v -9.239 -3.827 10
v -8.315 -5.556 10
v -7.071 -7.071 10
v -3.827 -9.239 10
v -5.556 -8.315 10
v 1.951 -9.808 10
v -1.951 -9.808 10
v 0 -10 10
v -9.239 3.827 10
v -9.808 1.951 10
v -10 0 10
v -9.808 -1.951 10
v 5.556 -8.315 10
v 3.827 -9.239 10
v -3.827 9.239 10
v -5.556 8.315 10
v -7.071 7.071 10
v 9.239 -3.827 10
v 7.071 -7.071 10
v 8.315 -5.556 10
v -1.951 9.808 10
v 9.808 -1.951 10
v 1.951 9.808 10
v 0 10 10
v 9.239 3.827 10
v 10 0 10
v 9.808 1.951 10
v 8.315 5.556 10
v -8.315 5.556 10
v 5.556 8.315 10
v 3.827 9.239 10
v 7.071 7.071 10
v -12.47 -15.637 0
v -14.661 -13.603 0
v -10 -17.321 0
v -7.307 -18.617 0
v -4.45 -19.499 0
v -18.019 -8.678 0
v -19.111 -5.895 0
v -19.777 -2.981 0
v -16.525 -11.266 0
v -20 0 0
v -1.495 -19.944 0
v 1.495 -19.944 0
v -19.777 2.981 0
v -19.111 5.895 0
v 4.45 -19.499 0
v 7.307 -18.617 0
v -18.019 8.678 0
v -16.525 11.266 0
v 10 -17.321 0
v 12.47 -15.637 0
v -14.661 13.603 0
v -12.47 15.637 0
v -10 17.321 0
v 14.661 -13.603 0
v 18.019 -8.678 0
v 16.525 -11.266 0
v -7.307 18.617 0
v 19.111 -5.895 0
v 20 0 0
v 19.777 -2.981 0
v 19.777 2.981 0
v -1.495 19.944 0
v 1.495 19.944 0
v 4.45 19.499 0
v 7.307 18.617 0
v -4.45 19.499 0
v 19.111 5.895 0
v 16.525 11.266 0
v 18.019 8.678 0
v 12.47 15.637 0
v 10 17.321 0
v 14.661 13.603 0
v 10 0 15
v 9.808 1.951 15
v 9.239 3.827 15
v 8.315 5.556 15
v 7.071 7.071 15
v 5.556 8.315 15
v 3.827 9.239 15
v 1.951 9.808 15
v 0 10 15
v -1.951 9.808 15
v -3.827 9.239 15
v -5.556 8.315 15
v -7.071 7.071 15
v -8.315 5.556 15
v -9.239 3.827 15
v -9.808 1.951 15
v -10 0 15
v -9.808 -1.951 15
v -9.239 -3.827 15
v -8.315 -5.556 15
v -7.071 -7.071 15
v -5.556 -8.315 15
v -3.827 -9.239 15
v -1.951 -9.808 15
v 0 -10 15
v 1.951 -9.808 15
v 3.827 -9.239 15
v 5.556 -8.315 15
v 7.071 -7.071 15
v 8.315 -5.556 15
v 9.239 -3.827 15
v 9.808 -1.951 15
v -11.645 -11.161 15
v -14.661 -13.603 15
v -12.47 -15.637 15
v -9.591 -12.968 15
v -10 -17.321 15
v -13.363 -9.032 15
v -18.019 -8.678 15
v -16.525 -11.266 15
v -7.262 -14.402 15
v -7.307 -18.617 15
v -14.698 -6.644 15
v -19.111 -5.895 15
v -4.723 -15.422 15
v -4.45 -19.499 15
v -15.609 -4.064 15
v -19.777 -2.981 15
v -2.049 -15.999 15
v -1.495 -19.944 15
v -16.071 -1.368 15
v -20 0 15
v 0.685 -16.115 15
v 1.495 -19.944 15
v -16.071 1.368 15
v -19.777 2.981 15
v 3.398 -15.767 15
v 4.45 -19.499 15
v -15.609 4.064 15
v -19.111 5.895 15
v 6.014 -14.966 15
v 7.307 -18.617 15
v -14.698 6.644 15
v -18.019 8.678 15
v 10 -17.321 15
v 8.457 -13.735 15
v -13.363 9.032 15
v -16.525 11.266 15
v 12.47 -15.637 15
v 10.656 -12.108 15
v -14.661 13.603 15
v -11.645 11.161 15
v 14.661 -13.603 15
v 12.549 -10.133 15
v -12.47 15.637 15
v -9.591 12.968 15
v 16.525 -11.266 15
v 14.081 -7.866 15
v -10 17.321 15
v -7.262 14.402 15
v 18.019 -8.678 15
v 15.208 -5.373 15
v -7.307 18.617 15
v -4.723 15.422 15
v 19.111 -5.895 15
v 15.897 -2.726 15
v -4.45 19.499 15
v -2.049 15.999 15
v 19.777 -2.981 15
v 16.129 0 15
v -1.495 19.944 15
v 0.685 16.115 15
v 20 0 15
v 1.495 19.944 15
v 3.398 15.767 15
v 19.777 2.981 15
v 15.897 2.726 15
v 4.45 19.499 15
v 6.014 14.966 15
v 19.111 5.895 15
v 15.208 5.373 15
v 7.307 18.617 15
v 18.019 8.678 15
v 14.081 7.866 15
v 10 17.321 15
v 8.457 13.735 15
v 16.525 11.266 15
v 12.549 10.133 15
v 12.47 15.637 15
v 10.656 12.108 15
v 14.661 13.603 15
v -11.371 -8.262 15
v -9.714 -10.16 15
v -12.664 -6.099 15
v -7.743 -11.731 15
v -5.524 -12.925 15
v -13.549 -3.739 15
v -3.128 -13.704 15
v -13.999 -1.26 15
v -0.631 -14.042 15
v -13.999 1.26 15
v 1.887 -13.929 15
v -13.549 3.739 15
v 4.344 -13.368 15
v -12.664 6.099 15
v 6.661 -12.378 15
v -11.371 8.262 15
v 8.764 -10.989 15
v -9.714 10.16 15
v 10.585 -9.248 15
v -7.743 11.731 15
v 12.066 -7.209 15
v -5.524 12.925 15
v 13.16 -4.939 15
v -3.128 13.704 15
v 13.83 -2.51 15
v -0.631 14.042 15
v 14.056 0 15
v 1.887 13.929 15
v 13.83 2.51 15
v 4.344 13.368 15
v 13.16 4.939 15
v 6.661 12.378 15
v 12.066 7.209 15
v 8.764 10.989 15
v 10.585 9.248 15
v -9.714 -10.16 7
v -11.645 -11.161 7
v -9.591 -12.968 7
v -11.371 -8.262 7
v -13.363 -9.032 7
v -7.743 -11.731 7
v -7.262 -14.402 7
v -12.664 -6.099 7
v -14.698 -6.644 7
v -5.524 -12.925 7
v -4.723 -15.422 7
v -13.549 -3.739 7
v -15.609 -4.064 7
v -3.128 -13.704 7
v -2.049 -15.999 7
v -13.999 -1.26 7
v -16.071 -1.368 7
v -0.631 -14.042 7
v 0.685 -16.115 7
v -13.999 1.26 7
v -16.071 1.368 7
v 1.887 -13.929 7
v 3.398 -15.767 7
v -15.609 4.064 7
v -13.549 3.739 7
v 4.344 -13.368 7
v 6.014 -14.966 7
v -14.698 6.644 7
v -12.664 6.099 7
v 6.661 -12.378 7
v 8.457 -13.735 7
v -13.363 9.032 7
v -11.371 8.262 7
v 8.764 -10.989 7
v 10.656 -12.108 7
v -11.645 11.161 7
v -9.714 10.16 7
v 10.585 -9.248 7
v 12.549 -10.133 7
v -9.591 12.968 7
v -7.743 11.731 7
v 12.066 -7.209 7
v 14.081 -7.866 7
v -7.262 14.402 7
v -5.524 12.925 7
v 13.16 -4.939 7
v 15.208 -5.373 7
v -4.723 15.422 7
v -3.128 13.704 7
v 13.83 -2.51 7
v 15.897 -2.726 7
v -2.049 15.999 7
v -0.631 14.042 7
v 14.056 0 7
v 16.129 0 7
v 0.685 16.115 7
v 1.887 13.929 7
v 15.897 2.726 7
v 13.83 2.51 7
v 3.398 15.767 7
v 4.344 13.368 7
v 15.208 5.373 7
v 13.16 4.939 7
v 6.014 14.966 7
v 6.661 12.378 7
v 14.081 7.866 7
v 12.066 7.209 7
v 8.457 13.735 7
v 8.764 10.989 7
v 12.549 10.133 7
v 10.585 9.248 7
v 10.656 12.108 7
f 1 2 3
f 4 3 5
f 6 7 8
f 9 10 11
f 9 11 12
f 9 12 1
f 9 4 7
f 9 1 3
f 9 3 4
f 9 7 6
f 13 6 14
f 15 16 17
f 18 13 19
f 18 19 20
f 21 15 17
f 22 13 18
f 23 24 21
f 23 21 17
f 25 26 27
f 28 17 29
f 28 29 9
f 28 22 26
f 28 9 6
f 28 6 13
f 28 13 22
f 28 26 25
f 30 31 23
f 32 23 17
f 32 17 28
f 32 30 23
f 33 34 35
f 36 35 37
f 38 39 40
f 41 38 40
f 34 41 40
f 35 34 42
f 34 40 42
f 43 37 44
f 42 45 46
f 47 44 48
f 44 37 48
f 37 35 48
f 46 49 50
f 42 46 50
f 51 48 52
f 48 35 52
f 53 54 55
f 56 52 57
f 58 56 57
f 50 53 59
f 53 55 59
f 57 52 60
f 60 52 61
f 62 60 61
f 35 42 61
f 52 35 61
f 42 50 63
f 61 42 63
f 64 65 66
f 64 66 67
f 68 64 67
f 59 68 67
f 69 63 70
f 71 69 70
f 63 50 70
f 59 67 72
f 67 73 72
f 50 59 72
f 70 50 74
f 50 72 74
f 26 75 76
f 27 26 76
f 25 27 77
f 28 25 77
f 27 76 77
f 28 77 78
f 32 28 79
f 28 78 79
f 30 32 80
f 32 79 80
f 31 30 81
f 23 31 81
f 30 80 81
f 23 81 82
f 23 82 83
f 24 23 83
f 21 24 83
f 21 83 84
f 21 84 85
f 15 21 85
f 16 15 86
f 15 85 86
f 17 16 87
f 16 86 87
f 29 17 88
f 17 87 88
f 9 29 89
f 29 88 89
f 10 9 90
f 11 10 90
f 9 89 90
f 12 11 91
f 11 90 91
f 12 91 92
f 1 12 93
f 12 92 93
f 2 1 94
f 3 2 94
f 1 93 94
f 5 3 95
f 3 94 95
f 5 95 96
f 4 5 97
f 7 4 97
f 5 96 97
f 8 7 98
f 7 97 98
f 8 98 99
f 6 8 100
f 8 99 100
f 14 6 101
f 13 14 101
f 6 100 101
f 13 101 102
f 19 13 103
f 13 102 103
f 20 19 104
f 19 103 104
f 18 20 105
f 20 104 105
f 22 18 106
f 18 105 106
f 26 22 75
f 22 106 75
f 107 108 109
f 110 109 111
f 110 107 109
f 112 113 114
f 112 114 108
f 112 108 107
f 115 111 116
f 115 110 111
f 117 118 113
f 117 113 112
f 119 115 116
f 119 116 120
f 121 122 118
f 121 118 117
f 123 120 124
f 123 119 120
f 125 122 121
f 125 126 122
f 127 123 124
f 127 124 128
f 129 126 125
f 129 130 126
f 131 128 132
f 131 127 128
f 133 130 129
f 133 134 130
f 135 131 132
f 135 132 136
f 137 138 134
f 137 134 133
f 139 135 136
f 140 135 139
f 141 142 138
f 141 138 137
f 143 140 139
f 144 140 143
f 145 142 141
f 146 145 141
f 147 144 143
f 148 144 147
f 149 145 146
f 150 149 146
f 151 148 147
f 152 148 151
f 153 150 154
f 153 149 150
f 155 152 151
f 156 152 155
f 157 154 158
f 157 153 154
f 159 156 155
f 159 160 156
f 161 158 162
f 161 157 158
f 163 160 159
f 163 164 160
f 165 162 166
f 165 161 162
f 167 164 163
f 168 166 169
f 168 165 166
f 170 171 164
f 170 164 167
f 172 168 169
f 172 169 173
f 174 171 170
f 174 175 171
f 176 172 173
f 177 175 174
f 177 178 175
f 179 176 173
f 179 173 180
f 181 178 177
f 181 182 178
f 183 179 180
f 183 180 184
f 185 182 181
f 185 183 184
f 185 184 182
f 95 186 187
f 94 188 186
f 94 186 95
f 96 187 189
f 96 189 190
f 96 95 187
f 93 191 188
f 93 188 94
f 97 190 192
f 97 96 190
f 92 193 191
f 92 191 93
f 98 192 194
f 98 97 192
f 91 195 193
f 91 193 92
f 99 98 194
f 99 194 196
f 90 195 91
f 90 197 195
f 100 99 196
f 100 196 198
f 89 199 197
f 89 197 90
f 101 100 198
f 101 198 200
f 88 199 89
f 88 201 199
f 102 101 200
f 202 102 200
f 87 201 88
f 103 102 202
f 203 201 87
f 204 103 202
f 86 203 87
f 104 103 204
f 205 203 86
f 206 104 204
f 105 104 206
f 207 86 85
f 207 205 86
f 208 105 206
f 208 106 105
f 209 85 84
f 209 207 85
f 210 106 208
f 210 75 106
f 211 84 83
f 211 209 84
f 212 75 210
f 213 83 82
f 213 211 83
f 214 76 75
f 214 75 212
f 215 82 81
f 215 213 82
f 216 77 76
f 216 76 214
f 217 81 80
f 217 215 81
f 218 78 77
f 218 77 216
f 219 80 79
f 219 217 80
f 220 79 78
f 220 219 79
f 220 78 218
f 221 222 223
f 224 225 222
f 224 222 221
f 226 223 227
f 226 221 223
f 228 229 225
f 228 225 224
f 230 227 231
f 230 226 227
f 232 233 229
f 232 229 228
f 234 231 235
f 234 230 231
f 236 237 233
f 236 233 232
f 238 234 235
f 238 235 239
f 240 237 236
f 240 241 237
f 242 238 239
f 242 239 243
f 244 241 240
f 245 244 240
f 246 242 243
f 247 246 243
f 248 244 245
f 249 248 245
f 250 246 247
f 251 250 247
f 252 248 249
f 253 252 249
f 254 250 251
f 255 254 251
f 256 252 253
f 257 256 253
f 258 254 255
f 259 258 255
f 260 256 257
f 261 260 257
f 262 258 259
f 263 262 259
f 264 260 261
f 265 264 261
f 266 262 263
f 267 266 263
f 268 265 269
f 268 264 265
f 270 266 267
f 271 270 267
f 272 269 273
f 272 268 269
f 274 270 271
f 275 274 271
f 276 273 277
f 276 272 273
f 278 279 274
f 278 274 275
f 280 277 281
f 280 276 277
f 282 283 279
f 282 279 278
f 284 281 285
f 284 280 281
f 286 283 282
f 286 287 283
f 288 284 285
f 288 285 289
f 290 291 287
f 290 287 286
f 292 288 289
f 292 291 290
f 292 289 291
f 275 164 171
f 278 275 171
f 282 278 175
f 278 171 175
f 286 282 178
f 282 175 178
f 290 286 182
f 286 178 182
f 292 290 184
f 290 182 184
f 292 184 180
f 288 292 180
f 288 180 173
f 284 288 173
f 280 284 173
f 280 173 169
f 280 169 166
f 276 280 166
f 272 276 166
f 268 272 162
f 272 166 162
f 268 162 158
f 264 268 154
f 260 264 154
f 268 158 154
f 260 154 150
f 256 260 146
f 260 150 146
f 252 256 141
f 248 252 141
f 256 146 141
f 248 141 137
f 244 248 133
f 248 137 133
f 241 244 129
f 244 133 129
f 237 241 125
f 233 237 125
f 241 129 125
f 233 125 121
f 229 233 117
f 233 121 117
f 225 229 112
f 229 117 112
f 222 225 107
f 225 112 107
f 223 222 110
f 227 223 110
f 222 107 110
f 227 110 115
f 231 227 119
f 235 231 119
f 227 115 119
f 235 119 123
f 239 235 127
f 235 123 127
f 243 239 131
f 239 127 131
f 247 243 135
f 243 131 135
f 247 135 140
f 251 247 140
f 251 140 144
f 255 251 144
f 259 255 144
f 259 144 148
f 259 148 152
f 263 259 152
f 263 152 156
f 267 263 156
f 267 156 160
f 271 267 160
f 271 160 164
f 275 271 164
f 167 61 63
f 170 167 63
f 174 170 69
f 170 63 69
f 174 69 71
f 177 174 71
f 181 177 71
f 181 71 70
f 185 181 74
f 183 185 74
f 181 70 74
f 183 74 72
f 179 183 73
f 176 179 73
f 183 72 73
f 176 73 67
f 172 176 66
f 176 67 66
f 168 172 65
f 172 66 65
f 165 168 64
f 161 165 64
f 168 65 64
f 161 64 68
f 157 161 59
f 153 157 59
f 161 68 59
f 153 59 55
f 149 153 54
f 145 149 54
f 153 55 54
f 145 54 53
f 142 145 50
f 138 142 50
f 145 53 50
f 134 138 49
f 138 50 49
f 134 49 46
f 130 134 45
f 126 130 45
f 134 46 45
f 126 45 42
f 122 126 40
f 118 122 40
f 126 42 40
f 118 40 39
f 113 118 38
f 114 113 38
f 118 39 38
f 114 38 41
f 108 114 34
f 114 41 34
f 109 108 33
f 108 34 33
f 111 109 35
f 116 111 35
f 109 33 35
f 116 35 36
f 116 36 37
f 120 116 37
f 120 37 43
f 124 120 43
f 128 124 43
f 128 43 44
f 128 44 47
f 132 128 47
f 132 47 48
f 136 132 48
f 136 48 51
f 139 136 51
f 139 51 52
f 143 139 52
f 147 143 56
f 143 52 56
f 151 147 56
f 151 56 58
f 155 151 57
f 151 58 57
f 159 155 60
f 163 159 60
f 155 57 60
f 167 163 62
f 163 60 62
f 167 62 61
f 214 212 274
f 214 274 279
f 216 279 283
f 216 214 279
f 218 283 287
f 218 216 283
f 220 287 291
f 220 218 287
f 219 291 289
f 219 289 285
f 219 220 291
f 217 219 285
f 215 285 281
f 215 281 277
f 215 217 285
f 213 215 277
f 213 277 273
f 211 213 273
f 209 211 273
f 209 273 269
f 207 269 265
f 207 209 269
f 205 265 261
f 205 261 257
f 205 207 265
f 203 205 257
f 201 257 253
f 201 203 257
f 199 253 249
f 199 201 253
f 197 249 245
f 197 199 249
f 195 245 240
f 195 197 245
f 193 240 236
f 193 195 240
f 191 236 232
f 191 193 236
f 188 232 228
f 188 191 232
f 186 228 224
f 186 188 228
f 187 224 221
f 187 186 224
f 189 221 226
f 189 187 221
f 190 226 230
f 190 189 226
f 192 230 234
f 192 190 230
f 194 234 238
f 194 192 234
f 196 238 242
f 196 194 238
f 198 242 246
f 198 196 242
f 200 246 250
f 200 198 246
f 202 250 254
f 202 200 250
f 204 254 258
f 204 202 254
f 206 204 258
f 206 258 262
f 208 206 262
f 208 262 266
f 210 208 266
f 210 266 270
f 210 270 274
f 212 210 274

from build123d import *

# Parameters (mm, degrees)
SKETCH1_R           = 20
BOSS_EXTRUDE1_DEPTH = 15
SKETCH2_R           = 10
CUT_EXTRUDE1_DEPTH  = 5
SKETCH3_R           = 16.129464202
SKETCH3_R_2         = 14.05591846
CUT_EXTRUDE2_DEPTH  = 8


with BuildPart() as part:
    # Sketch1 → Boss-Extrude1 (new body)
    with BuildSketch(Plane.XY):
        Circle(SKETCH1_R)
    extrude(amount=BOSS_EXTRUDE1_DEPTH)

    # Sketch2 → Cut-Extrude1 (cut)
    with BuildSketch(Plane.XY.offset(15)):
        Circle(SKETCH2_R)
    extrude(amount=-CUT_EXTRUDE1_DEPTH, mode=Mode.SUBTRACT)

    # Sketch3 → Cut-Extrude2 (cut)
    with BuildSketch(Plane.XY.offset(15)):
        Circle(SKETCH3_R)
        Circle(SKETCH3_R_2, mode=Mode.SUBTRACT)
    extrude(amount=-CUT_EXTRUDE2_DEPTH, mode=Mode.SUBTRACT)


solid = part.part
